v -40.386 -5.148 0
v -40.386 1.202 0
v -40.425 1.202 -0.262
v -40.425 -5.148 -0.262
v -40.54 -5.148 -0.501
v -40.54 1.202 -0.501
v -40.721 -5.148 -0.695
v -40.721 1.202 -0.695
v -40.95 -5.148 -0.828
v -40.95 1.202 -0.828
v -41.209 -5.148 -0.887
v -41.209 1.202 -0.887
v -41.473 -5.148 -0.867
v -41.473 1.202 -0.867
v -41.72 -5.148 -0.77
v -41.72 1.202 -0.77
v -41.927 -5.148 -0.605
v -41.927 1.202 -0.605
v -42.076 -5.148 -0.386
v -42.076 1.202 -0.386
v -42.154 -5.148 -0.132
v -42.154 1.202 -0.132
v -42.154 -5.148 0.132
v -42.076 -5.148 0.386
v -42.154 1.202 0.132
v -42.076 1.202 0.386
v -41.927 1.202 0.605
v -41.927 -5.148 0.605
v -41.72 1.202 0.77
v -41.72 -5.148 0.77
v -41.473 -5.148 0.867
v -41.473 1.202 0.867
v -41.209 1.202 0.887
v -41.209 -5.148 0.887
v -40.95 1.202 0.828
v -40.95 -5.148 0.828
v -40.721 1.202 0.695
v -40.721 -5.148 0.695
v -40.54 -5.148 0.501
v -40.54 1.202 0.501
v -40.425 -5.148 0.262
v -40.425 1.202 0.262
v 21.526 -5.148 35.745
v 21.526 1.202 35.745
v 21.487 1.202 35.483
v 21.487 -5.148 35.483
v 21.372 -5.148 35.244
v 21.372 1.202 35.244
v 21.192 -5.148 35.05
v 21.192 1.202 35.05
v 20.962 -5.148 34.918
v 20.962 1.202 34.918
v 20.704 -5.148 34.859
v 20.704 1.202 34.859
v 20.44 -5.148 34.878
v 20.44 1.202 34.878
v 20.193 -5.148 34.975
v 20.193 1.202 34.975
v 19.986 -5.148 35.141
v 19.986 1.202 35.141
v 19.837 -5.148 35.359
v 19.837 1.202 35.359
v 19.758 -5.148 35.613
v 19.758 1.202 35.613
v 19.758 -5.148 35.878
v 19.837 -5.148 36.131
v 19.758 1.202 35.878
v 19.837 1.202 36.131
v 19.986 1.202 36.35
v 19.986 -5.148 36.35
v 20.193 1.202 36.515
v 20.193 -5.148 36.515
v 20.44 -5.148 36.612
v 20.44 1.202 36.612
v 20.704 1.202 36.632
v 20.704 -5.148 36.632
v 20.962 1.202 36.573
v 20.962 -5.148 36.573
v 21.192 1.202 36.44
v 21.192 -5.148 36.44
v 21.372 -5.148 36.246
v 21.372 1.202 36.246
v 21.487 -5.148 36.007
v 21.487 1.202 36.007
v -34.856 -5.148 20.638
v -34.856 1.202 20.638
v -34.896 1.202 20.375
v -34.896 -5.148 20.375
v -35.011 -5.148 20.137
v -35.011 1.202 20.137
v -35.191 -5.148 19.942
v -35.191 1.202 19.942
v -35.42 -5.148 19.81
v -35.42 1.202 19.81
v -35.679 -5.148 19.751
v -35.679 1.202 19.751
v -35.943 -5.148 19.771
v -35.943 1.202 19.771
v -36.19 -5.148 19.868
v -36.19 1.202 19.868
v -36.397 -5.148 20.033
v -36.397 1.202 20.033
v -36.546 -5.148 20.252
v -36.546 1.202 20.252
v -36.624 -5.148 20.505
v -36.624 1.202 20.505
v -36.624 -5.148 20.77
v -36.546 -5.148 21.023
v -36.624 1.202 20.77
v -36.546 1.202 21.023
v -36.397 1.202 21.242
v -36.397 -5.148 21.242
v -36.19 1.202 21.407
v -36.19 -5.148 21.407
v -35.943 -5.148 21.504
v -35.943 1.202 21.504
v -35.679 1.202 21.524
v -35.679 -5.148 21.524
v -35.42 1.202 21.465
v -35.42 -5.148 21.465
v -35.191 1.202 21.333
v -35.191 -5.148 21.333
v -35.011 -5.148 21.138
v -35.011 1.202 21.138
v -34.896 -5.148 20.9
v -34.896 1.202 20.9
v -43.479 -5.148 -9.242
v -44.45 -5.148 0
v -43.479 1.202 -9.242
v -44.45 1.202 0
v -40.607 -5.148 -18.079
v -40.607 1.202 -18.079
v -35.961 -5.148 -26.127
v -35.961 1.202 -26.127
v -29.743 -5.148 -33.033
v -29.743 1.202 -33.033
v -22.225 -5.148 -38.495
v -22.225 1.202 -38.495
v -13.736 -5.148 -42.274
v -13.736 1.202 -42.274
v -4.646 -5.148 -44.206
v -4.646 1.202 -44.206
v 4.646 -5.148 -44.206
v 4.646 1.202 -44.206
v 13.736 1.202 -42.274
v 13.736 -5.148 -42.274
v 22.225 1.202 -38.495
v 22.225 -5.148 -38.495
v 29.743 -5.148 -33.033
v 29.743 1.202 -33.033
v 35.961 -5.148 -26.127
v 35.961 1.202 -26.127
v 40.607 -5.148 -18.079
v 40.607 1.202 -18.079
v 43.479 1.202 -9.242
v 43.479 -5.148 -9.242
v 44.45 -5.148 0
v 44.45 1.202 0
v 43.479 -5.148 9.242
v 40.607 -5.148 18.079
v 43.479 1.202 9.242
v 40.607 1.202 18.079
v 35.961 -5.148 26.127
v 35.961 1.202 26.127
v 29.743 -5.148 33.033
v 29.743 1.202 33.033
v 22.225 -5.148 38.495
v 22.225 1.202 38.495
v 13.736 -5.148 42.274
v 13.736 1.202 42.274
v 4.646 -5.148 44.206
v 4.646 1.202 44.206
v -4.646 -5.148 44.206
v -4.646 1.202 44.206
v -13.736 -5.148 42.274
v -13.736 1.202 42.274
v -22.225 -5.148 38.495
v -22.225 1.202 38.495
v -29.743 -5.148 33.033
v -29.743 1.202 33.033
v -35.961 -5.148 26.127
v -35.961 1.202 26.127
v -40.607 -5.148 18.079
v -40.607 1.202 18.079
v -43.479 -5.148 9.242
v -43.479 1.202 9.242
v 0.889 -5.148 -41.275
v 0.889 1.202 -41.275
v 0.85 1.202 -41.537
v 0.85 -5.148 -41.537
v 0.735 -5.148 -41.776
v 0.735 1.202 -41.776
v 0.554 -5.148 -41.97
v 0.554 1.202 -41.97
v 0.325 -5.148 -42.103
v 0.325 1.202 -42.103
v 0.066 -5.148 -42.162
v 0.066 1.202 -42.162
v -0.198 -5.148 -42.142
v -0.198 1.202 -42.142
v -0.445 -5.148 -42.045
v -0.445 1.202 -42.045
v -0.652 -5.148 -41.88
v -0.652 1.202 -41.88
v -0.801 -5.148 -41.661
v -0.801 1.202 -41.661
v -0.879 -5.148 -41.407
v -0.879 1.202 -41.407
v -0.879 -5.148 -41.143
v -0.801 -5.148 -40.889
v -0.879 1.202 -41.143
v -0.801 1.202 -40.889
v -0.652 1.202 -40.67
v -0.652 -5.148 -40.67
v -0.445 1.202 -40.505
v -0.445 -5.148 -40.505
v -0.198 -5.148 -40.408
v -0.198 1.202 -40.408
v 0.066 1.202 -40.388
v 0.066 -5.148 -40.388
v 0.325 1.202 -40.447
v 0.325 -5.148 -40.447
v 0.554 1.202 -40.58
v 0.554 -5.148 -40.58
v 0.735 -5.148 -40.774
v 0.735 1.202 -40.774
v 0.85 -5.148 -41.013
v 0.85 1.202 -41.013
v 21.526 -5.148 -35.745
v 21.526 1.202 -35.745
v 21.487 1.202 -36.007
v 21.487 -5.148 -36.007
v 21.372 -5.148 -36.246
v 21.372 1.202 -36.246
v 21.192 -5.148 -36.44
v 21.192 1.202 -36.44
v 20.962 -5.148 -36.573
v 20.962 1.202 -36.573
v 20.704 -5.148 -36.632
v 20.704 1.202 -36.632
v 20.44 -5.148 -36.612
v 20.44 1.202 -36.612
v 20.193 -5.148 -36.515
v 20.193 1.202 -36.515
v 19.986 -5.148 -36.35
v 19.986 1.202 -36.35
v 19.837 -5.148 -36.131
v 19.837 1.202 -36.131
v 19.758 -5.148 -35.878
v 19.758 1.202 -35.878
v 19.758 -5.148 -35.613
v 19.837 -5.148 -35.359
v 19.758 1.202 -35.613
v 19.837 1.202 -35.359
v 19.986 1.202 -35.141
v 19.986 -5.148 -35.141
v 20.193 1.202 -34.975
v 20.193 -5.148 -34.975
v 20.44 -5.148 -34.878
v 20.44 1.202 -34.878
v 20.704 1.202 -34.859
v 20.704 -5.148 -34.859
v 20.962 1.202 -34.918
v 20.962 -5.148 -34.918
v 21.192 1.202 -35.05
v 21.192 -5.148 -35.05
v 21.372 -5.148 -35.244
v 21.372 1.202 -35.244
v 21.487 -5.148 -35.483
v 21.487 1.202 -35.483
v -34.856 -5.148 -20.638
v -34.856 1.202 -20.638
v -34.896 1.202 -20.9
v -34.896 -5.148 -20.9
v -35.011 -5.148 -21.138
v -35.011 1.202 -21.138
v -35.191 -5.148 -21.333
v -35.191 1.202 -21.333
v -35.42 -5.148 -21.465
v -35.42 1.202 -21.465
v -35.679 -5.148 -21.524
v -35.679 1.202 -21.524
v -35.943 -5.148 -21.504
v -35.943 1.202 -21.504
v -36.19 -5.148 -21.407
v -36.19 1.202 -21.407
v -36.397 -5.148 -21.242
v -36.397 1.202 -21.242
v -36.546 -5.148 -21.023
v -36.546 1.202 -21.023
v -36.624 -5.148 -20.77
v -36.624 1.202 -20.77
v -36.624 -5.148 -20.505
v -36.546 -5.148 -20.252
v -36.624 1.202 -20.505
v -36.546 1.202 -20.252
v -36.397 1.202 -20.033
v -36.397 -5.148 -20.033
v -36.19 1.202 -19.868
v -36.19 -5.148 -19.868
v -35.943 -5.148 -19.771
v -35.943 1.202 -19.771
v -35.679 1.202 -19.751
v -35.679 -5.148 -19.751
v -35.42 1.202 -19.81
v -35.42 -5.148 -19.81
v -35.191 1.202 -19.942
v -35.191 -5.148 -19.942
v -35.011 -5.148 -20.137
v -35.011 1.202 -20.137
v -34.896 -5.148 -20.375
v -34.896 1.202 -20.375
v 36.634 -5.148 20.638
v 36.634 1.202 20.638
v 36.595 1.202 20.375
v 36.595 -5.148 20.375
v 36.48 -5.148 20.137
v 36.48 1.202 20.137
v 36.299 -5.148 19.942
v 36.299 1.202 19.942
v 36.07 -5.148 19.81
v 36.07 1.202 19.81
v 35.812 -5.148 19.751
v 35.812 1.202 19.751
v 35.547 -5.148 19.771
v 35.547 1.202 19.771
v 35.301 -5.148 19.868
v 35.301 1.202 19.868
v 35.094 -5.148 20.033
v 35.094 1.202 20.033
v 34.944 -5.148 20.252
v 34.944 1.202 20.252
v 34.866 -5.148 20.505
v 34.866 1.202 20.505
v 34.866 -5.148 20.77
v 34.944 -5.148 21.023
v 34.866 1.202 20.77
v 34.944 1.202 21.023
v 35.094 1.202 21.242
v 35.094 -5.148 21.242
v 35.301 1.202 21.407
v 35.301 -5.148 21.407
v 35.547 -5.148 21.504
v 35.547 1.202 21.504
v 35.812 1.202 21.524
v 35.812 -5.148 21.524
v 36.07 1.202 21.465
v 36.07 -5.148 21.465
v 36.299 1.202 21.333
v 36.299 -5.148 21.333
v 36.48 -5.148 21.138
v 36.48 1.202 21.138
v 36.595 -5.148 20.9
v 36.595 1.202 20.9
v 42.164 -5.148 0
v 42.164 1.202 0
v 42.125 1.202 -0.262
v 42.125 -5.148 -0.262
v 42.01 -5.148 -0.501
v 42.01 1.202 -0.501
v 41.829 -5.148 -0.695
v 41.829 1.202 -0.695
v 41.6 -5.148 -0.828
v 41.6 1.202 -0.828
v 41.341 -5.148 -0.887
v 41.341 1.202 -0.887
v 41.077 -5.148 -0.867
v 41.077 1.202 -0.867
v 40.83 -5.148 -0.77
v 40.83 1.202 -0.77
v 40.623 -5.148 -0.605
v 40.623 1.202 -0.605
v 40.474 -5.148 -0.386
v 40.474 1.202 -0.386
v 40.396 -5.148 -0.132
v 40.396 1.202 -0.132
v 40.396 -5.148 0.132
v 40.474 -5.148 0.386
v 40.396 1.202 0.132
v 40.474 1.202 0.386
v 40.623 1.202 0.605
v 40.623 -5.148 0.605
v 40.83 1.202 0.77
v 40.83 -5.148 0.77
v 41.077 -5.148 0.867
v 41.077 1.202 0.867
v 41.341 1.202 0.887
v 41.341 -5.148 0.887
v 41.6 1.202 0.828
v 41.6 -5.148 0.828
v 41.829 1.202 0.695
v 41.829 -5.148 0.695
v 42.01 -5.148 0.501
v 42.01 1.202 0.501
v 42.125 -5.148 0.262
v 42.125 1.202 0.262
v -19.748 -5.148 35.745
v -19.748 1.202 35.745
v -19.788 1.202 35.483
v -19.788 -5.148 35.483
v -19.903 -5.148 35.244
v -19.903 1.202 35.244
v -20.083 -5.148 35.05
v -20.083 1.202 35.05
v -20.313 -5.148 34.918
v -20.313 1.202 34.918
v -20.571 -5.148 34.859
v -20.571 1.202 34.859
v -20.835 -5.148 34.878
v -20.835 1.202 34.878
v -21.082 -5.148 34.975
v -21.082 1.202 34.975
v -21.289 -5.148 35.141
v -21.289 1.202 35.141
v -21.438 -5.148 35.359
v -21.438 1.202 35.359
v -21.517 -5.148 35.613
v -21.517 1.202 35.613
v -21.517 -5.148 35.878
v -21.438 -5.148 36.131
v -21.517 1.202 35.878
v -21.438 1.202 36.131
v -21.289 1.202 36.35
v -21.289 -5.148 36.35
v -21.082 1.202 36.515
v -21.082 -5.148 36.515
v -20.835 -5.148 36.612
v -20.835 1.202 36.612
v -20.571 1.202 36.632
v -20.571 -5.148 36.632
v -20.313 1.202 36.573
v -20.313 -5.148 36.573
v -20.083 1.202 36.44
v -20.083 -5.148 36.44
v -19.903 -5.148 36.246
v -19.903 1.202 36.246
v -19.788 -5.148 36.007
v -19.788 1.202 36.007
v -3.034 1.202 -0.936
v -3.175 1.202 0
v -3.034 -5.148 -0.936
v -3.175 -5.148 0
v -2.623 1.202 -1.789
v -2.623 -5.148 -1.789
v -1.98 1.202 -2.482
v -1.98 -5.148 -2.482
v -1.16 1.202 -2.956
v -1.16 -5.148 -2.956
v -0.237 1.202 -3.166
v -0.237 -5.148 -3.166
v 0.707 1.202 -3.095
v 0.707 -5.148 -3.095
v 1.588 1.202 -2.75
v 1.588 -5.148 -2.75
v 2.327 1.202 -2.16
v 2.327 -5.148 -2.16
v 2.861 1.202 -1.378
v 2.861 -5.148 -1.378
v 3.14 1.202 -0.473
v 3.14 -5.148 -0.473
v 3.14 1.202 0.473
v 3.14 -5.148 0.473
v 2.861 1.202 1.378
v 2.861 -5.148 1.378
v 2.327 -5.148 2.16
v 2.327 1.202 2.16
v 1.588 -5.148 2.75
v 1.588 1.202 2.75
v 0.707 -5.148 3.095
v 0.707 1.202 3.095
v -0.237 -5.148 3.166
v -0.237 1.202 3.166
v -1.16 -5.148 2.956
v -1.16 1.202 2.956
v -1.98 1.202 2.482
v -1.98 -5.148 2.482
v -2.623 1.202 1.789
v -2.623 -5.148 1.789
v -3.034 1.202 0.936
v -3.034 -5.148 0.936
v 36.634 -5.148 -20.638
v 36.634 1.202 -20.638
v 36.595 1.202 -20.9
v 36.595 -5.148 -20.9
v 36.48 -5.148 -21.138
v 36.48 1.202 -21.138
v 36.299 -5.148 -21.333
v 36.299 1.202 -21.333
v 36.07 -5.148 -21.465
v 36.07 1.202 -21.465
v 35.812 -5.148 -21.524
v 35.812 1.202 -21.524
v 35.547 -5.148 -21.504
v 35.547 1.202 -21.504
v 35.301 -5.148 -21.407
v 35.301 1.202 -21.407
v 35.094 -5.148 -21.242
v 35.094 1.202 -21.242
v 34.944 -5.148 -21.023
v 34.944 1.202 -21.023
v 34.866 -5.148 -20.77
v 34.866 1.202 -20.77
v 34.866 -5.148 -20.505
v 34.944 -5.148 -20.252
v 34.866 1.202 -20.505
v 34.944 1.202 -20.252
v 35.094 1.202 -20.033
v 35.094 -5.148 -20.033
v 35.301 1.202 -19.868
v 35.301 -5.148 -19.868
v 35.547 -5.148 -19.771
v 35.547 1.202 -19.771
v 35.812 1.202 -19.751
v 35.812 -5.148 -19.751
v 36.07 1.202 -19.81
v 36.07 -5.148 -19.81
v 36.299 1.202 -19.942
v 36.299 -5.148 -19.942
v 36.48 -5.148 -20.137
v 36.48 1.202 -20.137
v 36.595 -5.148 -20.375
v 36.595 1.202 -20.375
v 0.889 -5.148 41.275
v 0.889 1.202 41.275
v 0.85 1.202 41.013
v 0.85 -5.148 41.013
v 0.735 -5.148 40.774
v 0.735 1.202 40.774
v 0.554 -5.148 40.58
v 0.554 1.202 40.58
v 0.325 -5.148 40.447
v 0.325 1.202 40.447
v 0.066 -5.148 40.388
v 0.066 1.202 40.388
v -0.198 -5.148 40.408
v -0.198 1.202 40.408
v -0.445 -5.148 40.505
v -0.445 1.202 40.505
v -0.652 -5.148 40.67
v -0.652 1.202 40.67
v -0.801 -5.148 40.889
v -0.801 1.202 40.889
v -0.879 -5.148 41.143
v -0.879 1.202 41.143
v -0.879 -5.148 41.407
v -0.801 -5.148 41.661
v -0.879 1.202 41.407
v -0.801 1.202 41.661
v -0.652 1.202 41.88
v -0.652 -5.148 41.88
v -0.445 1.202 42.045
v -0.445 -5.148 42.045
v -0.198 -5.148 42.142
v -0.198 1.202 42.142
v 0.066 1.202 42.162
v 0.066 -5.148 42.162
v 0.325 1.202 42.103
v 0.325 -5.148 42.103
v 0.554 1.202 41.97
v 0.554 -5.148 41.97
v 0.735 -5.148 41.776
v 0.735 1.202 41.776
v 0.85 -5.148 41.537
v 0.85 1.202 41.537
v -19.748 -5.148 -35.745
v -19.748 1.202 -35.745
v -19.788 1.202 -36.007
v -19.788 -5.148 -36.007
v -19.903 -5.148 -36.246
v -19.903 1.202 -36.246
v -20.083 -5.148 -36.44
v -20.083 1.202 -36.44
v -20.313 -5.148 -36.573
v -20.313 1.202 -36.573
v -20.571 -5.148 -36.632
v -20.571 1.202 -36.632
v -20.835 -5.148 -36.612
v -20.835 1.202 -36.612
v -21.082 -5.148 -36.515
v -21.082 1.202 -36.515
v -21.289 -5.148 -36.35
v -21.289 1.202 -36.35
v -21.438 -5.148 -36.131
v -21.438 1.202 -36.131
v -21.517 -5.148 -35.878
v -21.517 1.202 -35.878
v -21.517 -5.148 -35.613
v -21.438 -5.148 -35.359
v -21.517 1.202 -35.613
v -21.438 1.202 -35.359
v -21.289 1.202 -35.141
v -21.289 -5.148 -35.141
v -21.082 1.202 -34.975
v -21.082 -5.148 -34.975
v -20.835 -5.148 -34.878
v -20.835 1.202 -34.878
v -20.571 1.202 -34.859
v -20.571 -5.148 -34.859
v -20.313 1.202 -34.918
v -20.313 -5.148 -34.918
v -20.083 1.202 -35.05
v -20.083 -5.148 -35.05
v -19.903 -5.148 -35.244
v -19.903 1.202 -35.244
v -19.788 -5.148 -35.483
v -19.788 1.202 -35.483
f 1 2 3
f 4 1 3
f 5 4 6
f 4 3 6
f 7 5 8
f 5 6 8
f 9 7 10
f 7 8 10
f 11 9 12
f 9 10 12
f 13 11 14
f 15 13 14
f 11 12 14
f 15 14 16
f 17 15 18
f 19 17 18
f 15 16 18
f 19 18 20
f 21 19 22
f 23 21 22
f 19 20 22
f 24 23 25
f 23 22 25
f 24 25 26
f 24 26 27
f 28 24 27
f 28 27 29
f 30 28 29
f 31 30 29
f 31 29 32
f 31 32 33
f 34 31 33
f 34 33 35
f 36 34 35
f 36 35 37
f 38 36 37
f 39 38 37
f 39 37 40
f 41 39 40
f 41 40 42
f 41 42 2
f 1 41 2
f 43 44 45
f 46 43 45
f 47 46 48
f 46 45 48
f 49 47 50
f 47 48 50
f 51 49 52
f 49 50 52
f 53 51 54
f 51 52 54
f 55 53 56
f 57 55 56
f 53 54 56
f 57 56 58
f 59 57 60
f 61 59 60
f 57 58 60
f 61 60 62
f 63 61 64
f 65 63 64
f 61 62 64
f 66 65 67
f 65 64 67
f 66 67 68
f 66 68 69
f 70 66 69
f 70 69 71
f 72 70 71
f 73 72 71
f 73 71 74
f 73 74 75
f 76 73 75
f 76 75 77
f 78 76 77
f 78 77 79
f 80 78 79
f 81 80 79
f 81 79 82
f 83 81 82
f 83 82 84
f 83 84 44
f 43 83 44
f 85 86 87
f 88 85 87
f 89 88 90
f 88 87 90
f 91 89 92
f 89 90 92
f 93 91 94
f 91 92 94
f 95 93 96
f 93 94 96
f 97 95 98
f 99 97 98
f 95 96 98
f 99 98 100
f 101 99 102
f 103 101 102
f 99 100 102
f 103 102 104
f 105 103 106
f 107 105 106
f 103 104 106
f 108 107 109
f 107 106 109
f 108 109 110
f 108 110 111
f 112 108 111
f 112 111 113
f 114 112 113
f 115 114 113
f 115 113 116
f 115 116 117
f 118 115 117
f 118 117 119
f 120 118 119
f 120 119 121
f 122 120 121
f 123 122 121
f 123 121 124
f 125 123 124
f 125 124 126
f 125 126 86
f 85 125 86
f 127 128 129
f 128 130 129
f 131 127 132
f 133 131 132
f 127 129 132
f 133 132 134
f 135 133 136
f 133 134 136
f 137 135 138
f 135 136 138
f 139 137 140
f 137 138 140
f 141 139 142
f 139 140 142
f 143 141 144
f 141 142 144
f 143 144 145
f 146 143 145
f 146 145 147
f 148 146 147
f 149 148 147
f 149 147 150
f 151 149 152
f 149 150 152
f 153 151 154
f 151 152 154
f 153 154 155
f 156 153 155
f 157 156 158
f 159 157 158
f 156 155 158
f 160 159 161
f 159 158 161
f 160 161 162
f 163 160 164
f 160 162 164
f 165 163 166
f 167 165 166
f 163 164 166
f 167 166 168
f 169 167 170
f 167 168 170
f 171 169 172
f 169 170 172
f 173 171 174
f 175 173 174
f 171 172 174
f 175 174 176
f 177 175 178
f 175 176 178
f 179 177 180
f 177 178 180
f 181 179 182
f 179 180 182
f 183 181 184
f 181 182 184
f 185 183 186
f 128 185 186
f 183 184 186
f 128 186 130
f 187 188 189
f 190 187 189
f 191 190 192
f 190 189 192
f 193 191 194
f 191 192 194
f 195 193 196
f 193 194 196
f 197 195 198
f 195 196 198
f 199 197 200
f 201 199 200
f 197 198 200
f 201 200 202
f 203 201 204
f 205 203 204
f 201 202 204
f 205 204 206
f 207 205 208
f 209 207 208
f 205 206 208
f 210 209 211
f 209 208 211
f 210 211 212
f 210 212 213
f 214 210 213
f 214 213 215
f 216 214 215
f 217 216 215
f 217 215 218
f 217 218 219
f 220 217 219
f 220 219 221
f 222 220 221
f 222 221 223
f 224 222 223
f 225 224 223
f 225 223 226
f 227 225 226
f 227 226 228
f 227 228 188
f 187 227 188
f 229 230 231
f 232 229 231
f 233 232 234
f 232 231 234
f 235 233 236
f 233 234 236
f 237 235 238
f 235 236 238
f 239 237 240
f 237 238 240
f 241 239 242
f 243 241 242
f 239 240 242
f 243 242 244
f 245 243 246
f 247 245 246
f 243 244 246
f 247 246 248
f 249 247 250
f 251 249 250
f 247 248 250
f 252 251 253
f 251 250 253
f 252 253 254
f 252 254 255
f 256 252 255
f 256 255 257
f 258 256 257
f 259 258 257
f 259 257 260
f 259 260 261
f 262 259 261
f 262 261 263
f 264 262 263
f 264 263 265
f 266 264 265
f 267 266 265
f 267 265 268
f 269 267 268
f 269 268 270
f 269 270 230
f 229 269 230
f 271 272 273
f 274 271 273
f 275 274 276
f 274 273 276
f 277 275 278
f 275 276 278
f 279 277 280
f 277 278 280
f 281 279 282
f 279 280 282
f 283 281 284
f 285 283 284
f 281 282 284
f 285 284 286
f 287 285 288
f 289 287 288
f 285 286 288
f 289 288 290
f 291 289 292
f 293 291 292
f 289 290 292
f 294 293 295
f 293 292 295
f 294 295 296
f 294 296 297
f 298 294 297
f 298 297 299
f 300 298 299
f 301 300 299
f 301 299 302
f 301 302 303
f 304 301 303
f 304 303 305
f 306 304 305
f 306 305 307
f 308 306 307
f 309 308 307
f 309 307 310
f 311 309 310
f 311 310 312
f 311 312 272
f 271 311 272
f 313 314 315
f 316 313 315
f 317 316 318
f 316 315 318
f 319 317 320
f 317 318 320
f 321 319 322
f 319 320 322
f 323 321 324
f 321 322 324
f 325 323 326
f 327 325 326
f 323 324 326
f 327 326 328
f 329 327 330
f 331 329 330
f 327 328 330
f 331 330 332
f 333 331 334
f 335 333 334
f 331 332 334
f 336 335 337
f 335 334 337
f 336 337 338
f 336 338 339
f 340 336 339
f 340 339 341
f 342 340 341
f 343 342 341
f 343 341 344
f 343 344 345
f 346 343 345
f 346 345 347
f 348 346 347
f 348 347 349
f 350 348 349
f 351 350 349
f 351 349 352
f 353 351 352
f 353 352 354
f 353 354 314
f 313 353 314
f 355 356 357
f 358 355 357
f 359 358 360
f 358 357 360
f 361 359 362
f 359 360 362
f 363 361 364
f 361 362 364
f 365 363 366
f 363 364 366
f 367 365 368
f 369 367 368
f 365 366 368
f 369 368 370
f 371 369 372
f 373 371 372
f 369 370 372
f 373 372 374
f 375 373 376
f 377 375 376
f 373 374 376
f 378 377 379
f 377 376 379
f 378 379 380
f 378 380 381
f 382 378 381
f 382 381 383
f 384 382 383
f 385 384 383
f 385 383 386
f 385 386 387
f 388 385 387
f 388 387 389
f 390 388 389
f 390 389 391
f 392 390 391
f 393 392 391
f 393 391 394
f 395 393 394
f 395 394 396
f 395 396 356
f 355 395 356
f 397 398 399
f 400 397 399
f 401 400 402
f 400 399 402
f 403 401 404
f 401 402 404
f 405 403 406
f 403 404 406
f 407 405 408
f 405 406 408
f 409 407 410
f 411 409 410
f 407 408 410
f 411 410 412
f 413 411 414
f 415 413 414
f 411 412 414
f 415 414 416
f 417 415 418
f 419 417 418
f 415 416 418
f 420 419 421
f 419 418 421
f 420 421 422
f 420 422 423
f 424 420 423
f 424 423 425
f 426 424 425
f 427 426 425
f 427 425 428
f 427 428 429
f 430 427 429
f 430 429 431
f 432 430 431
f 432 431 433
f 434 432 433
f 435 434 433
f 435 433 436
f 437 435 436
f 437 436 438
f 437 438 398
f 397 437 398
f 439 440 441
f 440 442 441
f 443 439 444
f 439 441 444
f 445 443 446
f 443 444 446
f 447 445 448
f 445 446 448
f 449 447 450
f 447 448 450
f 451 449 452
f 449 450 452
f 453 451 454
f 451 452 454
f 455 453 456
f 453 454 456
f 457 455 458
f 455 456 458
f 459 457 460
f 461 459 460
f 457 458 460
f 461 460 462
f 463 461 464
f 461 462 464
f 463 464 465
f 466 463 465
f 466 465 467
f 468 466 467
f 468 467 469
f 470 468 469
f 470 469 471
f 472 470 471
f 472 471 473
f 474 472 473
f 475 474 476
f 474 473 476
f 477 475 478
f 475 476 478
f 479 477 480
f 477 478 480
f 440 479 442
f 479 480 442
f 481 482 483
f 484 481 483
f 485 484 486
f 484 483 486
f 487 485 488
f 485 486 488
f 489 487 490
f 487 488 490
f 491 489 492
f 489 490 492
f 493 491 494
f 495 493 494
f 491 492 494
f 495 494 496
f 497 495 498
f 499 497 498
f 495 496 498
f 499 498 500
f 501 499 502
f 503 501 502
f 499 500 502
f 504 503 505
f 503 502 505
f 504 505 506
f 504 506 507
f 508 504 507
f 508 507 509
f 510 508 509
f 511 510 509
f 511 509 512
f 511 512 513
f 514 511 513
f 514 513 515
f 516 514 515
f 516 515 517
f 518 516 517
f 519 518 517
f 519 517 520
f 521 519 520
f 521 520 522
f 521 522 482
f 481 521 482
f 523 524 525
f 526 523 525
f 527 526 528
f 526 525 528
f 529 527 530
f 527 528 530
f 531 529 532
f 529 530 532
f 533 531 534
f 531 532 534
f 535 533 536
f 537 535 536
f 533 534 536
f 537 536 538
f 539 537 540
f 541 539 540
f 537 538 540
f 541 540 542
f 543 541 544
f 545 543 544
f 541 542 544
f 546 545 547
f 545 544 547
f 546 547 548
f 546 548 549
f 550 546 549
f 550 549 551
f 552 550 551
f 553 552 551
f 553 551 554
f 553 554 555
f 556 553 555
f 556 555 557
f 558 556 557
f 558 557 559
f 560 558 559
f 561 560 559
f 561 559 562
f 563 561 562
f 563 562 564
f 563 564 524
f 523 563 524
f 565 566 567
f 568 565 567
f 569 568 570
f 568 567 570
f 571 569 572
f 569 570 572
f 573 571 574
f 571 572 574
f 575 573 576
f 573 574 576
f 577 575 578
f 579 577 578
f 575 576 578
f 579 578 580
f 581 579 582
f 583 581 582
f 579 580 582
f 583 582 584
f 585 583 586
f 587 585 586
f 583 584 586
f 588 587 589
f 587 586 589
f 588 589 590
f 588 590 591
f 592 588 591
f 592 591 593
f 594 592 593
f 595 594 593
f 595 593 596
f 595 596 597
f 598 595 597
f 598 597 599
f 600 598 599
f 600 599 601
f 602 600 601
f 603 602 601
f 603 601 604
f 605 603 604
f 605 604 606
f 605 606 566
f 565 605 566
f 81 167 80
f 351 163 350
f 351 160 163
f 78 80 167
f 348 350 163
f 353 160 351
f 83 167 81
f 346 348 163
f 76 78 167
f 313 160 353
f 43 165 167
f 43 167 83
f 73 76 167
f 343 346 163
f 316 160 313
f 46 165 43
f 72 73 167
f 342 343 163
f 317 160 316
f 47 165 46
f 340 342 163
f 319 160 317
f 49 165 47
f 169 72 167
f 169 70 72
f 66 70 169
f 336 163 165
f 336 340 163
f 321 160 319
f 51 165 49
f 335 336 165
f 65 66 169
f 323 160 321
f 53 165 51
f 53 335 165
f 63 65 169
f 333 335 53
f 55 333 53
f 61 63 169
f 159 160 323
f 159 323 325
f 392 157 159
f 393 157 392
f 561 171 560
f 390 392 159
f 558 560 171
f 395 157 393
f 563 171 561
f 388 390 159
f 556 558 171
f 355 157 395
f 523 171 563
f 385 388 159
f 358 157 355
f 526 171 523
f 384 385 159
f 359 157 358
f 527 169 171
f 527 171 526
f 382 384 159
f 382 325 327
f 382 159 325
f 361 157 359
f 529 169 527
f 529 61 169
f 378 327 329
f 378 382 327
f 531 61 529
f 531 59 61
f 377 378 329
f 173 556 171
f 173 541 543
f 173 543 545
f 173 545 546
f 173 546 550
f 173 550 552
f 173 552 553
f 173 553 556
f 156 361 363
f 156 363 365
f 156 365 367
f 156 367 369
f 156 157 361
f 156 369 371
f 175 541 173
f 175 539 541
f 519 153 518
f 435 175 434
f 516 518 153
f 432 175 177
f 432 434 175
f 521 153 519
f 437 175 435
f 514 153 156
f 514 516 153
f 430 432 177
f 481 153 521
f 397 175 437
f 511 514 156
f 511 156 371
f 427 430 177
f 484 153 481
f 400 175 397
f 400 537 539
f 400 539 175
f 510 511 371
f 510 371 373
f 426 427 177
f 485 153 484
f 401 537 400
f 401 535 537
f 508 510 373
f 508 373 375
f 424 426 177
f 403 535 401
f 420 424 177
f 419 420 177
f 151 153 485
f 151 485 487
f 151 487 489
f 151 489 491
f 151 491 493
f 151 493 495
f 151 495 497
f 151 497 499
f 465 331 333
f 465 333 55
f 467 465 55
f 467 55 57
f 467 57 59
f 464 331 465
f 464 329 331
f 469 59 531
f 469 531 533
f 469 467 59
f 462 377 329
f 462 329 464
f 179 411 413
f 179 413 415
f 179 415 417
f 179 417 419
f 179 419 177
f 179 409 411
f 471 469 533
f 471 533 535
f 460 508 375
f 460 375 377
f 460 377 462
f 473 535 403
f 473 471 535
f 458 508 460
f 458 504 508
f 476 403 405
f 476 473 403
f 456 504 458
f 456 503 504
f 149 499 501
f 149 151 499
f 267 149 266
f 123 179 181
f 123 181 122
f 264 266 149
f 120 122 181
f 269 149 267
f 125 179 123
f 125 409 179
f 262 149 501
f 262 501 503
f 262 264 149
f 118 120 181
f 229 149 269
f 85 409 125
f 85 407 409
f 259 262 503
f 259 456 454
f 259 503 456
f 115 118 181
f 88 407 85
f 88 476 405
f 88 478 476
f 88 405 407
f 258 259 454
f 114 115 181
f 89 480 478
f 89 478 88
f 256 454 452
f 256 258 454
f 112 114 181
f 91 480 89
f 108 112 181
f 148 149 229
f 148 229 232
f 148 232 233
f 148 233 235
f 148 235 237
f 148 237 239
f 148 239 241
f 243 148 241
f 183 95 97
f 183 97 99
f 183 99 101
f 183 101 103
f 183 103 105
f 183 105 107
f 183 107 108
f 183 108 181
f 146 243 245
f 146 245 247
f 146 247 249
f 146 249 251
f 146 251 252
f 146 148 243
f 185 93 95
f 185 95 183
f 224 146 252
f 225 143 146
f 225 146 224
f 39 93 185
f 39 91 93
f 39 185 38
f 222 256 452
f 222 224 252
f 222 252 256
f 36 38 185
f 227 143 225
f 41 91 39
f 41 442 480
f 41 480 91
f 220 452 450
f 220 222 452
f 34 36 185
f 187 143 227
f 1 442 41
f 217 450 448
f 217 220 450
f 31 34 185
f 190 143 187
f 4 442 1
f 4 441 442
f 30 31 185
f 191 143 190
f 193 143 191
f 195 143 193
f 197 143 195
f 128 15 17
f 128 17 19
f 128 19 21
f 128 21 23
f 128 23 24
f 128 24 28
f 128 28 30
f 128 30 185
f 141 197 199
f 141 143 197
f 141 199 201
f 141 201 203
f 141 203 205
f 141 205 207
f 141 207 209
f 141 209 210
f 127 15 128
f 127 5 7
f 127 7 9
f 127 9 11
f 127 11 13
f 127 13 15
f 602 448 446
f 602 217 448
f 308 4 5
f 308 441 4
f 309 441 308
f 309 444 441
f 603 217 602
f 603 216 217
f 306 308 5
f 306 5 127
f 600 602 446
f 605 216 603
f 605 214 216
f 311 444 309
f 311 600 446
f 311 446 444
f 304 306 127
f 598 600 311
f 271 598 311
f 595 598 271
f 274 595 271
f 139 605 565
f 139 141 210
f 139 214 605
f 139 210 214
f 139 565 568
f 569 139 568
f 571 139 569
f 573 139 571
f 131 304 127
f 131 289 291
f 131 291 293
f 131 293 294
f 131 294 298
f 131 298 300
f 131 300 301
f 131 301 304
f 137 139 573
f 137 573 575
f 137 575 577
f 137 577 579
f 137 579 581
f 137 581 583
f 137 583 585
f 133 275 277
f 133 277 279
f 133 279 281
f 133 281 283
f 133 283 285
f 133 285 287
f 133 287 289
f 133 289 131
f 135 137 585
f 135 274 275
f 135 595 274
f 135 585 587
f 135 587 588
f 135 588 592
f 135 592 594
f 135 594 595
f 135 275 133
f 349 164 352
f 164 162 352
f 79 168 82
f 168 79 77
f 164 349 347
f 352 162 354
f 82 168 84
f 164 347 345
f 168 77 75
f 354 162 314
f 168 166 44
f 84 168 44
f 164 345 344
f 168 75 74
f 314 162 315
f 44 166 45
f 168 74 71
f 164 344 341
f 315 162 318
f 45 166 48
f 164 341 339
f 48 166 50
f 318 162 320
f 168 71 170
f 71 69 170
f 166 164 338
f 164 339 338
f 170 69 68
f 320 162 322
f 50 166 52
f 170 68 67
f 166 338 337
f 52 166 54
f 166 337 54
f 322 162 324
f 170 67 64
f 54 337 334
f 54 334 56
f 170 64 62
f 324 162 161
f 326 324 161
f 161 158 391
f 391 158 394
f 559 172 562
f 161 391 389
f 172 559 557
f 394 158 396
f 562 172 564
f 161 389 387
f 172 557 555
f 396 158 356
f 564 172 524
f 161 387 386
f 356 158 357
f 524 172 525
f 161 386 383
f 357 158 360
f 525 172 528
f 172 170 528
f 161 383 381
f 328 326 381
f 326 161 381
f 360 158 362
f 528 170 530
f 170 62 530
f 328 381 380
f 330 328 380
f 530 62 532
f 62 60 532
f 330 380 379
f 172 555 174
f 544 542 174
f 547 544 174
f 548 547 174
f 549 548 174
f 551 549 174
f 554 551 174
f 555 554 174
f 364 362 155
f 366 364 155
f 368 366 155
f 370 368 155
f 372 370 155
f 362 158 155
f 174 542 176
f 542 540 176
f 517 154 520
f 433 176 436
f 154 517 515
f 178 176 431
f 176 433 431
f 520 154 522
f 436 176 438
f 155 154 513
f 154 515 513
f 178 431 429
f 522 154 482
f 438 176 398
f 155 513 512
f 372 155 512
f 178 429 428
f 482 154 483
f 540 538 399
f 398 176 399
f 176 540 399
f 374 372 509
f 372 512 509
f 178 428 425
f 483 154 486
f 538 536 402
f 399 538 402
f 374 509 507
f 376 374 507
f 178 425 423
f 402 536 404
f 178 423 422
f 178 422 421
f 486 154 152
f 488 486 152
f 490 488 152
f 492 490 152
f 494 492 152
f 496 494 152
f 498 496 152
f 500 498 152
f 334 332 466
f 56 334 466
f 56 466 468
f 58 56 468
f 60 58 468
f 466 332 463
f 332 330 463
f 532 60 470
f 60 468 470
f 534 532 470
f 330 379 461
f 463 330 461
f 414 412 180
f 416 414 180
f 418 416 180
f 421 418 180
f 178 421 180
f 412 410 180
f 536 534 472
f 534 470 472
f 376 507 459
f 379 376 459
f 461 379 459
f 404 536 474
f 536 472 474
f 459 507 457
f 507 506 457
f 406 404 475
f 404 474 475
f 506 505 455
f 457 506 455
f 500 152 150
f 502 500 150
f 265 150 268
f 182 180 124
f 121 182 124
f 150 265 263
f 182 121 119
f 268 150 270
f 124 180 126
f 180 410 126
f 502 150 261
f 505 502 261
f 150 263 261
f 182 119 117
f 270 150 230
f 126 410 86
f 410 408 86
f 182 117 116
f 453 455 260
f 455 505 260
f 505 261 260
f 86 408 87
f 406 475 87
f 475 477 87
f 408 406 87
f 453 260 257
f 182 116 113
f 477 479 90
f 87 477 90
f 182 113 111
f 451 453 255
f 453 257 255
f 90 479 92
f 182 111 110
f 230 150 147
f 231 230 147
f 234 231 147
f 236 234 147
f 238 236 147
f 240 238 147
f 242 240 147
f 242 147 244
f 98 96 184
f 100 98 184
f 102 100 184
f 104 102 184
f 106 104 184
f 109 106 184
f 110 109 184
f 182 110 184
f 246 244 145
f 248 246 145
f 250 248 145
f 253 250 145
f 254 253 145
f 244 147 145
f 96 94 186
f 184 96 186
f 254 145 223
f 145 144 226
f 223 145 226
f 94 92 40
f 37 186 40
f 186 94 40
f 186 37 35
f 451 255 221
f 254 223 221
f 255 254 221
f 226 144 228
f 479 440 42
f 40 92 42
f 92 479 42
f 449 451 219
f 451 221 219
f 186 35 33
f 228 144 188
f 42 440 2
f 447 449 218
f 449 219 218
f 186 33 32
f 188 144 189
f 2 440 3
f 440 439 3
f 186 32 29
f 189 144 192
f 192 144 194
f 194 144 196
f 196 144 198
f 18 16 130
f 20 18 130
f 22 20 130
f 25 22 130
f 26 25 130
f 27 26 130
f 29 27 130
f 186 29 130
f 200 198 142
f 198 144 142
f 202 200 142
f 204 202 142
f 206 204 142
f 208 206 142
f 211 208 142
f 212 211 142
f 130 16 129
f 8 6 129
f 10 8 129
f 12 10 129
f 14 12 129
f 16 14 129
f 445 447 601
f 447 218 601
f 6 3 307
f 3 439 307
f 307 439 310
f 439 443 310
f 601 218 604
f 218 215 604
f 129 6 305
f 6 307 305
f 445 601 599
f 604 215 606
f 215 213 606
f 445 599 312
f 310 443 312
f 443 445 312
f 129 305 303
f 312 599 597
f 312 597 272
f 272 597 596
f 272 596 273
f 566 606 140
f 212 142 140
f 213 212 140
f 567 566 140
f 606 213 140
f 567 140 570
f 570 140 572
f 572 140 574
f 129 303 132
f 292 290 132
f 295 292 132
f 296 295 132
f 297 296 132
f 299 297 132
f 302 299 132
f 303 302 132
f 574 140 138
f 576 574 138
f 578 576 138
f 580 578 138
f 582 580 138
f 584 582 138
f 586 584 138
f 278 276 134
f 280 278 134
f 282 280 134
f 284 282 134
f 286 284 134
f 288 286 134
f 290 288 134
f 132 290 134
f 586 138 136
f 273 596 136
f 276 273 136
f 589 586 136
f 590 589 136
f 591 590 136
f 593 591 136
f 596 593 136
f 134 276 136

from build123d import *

# Parameters (mm, degrees)
SKETCH5_R          = 0.889
CUT_EXTRUDE1_DEPTH = 12.7


with BuildPart() as part:
    # Sketch2 → Revolve1 (revolve)
    with BuildSketch(Plane.XY):
        Polygon((-38.1, -5.147815534), (-44.45, -5.147815534), (-44.45, 1.202184466), (-3.175, 1.202184466), (-3.175, -5.147815534), (-34.925, -5.147815534), align=None)
    revolve(axis=Axis((0, 49.967071373, 0), (0, -1, 0)))

    # Sketch5 → Cut-Extrude1 (cut)
    with BuildSketch(Plane(origin=(0, 1.202184466, 0), x_dir=(1, 0, 0), z_dir=(0, 1, 0))):
        with Locations((-41.275, 0)):
            Circle(SKETCH5_R)
        with Locations((-35.745198541, 20.6375)):
            Circle(SKETCH5_R)
        with Locations((-20.6375, 35.745198541)):
            Circle(SKETCH5_R)
        with Locations((0, 41.275)):
            Circle(SKETCH5_R)
        with Locations((20.6375, 35.745198541)):
            Circle(SKETCH5_R)
        with Locations((35.745198541, 20.6375)):
            Circle(SKETCH5_R)
        with Locations((41.275, 0)):
            Circle(SKETCH5_R)
        with Locations((35.745198541, -20.6375)):
            Circle(SKETCH5_R)
        with Locations((20.6375, -35.745198541)):
            Circle(SKETCH5_R)
        with Locations((0, -41.275)):
            Circle(SKETCH5_R)
        with Locations((-20.6375, -35.745198541)):
            Circle(SKETCH5_R)
        with Locations((-35.745198541, -20.6375)):
            Circle(SKETCH5_R)
    extrude(amount=-CUT_EXTRUDE1_DEPTH, mode=Mode.SUBTRACT)


solid = part.part
